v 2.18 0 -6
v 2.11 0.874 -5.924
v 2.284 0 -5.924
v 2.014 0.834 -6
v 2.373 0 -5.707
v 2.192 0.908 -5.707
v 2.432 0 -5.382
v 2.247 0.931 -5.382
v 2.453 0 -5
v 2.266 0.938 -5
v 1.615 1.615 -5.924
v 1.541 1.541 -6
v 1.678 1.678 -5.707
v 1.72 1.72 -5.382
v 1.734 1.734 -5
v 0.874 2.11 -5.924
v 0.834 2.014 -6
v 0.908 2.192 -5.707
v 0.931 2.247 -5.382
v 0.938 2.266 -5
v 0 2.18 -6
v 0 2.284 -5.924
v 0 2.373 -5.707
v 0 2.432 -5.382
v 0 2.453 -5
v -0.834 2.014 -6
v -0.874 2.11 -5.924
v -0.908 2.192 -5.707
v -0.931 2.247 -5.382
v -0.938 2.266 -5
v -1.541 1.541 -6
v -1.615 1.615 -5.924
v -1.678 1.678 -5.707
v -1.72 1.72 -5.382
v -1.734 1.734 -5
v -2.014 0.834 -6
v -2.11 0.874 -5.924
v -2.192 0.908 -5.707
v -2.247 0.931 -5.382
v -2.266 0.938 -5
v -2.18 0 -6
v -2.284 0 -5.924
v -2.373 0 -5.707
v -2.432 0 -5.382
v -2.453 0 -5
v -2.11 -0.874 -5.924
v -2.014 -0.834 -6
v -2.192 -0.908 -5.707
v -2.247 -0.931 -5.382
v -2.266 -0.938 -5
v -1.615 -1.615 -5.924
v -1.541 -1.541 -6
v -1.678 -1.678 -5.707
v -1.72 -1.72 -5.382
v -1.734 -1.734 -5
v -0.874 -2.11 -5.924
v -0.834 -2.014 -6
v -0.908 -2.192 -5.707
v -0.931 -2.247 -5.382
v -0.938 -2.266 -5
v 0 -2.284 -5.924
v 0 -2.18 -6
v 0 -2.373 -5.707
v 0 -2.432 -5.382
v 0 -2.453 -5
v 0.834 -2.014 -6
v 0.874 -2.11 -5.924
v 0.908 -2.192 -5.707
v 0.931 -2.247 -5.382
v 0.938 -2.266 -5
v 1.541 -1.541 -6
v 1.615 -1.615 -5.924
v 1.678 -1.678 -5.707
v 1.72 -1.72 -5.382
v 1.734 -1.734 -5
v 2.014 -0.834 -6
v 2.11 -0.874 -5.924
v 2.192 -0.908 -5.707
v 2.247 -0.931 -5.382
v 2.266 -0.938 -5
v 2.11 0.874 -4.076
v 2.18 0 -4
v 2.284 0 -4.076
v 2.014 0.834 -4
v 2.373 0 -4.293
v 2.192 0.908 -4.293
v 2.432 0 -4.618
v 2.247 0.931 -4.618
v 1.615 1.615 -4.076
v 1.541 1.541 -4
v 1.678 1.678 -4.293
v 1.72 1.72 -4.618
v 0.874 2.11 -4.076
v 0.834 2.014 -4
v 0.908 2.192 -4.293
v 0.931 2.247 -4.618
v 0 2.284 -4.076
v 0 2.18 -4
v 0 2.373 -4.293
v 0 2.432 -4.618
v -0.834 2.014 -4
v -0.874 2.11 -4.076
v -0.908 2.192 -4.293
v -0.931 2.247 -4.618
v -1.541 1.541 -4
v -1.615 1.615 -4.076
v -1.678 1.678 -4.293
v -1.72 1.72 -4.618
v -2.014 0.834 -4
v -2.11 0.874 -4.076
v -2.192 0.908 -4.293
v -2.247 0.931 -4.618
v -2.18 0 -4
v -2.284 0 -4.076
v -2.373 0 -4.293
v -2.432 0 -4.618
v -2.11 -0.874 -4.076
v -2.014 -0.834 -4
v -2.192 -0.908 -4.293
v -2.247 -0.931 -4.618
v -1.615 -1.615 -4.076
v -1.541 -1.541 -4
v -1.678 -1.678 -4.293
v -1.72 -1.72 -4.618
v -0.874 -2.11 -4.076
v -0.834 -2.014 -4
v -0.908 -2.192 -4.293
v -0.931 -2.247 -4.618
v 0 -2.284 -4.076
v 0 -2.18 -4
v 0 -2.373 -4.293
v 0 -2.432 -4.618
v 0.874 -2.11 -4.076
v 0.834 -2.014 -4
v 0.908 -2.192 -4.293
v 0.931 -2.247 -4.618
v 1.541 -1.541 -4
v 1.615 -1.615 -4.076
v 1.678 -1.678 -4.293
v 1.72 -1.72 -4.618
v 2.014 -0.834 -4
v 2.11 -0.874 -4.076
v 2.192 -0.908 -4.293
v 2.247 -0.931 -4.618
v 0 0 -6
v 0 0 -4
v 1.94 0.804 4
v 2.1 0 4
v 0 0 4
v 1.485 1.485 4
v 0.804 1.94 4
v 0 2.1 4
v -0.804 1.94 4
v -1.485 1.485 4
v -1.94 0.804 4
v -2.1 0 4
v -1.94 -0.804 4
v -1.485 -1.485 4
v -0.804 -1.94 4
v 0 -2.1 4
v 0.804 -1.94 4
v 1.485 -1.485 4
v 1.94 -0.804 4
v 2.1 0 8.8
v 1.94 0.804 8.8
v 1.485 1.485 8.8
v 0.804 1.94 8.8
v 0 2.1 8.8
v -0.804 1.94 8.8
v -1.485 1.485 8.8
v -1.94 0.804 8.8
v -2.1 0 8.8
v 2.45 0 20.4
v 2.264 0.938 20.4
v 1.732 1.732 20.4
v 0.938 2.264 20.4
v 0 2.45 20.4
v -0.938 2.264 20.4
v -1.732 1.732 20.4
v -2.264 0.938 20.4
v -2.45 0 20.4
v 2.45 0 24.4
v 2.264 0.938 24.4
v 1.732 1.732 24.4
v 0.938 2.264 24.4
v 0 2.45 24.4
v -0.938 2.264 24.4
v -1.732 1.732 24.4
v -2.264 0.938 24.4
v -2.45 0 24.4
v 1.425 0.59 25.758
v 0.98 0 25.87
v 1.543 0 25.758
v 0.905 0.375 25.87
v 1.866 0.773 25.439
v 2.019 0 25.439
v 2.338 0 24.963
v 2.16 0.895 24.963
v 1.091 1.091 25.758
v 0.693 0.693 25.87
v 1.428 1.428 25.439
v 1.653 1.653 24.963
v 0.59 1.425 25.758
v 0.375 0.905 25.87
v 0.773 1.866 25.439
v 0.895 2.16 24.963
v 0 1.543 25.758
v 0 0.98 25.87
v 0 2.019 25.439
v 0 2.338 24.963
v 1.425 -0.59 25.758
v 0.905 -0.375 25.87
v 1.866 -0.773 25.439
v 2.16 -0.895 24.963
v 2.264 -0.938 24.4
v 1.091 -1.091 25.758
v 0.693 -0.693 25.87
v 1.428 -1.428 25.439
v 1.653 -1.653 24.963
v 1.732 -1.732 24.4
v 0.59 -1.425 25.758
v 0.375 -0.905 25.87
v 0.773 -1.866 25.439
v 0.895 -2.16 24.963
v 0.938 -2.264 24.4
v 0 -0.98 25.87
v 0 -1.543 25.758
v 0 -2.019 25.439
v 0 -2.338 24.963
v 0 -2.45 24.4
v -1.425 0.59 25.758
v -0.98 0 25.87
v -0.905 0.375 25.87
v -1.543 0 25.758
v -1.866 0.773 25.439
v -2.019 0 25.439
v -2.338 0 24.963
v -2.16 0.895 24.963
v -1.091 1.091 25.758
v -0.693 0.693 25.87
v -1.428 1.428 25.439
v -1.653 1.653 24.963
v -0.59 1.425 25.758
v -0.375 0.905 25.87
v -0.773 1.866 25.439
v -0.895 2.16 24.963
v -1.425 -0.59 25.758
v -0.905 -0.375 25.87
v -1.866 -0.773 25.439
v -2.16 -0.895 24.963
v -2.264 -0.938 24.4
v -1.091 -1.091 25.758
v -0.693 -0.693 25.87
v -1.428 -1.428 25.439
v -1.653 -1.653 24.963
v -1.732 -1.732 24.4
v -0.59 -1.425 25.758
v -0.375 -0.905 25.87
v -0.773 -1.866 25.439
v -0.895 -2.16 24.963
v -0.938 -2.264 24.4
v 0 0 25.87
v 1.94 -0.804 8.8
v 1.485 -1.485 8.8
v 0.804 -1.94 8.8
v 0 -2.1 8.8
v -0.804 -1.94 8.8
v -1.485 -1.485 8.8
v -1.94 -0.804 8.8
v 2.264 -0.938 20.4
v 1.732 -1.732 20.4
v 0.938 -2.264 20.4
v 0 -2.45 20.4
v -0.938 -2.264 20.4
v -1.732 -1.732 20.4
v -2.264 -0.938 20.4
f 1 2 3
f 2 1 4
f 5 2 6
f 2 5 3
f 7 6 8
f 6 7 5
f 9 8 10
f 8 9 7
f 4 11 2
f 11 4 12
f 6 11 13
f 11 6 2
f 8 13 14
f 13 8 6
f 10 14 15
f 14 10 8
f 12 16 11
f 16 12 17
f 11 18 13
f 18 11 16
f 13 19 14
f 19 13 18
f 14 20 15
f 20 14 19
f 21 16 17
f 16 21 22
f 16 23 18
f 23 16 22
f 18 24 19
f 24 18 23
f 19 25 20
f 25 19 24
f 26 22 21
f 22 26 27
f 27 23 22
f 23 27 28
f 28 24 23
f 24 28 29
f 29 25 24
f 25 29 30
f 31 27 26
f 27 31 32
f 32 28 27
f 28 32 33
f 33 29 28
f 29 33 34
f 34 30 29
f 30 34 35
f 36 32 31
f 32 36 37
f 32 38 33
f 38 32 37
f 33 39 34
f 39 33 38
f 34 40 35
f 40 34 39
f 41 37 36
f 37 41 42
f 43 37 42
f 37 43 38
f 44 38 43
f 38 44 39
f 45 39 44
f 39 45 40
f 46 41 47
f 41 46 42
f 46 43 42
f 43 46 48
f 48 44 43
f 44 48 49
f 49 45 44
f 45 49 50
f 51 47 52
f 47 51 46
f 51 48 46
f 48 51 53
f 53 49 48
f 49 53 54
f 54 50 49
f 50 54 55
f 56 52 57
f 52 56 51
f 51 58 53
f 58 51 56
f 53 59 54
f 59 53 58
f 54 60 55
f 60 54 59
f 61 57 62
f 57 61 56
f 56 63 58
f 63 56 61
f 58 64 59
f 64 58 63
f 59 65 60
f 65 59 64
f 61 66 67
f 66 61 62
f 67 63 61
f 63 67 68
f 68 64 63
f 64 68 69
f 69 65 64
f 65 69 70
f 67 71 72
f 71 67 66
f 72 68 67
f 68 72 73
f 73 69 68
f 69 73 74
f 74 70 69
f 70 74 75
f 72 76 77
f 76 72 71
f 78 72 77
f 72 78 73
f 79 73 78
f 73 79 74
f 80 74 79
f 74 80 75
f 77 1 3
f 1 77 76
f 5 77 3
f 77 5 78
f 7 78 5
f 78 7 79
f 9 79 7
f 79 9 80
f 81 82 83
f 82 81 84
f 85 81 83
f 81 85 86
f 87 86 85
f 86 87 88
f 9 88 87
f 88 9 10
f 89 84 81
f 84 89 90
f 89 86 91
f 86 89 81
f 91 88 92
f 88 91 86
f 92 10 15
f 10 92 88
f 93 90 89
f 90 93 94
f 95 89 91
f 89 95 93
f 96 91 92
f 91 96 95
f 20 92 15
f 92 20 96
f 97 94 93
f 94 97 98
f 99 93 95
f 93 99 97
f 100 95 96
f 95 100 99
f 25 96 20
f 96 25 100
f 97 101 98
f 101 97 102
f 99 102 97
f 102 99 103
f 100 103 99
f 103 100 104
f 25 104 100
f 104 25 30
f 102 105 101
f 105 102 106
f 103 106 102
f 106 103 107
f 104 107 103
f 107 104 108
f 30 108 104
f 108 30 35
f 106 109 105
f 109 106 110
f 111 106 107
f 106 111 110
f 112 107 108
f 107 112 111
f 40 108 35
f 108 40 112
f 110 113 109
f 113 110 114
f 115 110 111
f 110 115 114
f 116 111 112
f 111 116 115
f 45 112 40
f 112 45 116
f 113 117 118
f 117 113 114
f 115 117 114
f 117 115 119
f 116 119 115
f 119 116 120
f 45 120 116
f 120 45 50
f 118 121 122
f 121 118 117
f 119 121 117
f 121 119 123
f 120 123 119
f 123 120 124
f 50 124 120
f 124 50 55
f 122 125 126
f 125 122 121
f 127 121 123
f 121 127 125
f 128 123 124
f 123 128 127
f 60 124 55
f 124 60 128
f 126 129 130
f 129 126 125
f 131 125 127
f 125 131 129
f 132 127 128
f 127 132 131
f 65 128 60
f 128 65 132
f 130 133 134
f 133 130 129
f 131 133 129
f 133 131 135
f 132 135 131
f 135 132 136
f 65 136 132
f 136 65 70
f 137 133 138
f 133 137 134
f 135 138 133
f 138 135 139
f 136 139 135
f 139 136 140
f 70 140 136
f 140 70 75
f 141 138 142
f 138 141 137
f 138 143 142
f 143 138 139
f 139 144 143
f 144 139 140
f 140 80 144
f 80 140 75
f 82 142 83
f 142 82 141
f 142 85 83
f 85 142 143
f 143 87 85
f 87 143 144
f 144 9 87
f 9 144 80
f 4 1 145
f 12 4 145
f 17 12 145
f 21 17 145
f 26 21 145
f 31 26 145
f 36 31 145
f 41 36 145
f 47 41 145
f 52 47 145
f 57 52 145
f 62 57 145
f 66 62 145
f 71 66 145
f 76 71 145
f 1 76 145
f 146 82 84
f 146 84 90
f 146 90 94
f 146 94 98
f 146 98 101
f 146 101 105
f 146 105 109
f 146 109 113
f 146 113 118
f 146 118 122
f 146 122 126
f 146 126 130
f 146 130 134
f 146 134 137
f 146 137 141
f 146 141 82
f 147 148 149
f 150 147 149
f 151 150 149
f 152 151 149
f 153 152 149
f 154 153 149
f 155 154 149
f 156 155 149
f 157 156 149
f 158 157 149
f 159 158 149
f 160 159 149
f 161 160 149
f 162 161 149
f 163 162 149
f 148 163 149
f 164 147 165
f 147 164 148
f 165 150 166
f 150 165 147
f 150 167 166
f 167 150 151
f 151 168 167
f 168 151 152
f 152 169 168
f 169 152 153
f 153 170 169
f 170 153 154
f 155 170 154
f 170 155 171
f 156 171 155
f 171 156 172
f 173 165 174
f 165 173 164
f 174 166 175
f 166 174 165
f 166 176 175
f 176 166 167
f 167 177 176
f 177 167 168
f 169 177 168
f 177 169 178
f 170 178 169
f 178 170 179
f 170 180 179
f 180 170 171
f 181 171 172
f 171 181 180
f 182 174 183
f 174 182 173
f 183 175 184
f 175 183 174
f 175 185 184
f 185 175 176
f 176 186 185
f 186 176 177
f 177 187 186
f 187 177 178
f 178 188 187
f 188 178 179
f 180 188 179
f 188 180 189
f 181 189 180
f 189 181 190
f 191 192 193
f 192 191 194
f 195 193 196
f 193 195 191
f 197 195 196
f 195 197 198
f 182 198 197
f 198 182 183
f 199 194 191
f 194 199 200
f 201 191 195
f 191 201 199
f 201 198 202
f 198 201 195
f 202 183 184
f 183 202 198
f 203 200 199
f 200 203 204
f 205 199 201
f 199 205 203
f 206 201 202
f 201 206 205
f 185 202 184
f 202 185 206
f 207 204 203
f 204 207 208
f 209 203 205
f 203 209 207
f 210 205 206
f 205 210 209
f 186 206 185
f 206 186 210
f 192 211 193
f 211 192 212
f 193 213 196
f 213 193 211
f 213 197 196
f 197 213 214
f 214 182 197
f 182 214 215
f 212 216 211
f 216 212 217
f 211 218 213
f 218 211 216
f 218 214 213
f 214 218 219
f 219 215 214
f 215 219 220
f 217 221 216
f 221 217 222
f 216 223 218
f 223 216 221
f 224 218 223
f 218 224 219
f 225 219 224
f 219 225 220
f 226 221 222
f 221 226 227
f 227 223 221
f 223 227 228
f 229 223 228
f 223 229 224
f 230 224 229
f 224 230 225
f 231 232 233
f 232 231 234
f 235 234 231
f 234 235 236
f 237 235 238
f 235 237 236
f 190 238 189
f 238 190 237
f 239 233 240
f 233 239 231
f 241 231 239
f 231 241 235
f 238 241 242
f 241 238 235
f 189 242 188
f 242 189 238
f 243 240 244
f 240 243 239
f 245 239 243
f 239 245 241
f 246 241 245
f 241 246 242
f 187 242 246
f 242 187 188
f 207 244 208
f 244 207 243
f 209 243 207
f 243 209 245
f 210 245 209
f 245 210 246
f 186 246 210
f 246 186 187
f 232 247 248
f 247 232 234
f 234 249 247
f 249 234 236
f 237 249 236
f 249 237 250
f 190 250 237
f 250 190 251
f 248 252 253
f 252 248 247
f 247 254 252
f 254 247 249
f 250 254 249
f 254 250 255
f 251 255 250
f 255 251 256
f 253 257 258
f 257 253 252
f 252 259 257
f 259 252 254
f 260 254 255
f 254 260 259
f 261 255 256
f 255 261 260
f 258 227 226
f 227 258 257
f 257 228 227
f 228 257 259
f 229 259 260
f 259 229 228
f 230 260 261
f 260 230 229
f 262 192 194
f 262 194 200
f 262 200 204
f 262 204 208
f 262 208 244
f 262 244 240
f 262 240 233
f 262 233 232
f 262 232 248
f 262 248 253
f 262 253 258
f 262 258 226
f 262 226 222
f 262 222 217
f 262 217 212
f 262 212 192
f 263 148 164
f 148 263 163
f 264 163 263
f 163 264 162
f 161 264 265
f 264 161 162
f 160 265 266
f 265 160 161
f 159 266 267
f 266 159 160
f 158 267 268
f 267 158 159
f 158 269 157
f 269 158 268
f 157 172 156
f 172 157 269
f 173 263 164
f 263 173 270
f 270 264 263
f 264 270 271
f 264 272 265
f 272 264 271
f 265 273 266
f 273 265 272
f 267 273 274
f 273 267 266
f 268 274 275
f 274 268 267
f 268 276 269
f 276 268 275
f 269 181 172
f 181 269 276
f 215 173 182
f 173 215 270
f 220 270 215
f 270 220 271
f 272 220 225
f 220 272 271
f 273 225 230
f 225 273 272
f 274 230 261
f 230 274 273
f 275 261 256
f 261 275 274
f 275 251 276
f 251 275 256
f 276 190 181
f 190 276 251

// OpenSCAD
use <../../lib.scad>
use <../../p/2-4con6.scad>
use <../../p/2-4cyli.scad>
use <93220s04.scad>
function ldraw_lib__s__93220s01() = [
// 0 ~Minifig Baseball Bat without Grip Area
// 0 Name: s\93220s01.dat
// 0 Author: Gerald Lasser [GeraldLasser]
// 0 !LDRAW_ORG Subpart UPDATE 2020-01
// 0 !LICENSE Licensed under CC BY 4.0 : see CAreadme.txt
// 
// 0 BFC CERTIFY CCW
  [0,"BFC","CERTIFY"],
  [0,"BFC","CCW"],
// 
// 0 !HISTORY 2020-06-28 [PTadmin] Official Update 2020-01
// 
// 
// 1 16 0 0 0 1 0 0 0 1 0 0 0 1 s\93220s04.dat
  [1,16,0,0,0,1,0,0,0,1,0,0,0,1, ldraw_lib__s__93220s04()],
// 1 16 0 -10 0 5.25 0 0 0 -12 0 0 0 -5.25 2-4cyli.dat
  [1,16,0,-10,0,5.25,0,0,0,-12,0,0,0,-5.25, ldraw_lib__2_4cyli()],
// 1 16 0 -51 0 .875 0 0 0 29 0 0 0 -.875 2-4con6.dat
  [1,16,0,-51,0,.875,0,0,0,29,0,0,0,-.875, ldraw_lib__2_4con6()],
// 1 16 0 -51 0 6.125 0 0 0 -10 0 0 0 -6.125 2-4cyli.dat
  [1,16,0,-51,0,6.125,0,0,0,-10,0,0,0,-6.125, ldraw_lib__2_4cyli()],
];
module ldraw_lib__s__93220s01(step=0, col=false, unit=2/5, alt=false, line=0.2, solid=!$preview)
    makepoly(ldraw_lib__s__93220s01(), step=step, col=col, unit=unit, alt=alt, line=line, solid=solid);
ldraw_lib__s__93220s01(line=0.2);
